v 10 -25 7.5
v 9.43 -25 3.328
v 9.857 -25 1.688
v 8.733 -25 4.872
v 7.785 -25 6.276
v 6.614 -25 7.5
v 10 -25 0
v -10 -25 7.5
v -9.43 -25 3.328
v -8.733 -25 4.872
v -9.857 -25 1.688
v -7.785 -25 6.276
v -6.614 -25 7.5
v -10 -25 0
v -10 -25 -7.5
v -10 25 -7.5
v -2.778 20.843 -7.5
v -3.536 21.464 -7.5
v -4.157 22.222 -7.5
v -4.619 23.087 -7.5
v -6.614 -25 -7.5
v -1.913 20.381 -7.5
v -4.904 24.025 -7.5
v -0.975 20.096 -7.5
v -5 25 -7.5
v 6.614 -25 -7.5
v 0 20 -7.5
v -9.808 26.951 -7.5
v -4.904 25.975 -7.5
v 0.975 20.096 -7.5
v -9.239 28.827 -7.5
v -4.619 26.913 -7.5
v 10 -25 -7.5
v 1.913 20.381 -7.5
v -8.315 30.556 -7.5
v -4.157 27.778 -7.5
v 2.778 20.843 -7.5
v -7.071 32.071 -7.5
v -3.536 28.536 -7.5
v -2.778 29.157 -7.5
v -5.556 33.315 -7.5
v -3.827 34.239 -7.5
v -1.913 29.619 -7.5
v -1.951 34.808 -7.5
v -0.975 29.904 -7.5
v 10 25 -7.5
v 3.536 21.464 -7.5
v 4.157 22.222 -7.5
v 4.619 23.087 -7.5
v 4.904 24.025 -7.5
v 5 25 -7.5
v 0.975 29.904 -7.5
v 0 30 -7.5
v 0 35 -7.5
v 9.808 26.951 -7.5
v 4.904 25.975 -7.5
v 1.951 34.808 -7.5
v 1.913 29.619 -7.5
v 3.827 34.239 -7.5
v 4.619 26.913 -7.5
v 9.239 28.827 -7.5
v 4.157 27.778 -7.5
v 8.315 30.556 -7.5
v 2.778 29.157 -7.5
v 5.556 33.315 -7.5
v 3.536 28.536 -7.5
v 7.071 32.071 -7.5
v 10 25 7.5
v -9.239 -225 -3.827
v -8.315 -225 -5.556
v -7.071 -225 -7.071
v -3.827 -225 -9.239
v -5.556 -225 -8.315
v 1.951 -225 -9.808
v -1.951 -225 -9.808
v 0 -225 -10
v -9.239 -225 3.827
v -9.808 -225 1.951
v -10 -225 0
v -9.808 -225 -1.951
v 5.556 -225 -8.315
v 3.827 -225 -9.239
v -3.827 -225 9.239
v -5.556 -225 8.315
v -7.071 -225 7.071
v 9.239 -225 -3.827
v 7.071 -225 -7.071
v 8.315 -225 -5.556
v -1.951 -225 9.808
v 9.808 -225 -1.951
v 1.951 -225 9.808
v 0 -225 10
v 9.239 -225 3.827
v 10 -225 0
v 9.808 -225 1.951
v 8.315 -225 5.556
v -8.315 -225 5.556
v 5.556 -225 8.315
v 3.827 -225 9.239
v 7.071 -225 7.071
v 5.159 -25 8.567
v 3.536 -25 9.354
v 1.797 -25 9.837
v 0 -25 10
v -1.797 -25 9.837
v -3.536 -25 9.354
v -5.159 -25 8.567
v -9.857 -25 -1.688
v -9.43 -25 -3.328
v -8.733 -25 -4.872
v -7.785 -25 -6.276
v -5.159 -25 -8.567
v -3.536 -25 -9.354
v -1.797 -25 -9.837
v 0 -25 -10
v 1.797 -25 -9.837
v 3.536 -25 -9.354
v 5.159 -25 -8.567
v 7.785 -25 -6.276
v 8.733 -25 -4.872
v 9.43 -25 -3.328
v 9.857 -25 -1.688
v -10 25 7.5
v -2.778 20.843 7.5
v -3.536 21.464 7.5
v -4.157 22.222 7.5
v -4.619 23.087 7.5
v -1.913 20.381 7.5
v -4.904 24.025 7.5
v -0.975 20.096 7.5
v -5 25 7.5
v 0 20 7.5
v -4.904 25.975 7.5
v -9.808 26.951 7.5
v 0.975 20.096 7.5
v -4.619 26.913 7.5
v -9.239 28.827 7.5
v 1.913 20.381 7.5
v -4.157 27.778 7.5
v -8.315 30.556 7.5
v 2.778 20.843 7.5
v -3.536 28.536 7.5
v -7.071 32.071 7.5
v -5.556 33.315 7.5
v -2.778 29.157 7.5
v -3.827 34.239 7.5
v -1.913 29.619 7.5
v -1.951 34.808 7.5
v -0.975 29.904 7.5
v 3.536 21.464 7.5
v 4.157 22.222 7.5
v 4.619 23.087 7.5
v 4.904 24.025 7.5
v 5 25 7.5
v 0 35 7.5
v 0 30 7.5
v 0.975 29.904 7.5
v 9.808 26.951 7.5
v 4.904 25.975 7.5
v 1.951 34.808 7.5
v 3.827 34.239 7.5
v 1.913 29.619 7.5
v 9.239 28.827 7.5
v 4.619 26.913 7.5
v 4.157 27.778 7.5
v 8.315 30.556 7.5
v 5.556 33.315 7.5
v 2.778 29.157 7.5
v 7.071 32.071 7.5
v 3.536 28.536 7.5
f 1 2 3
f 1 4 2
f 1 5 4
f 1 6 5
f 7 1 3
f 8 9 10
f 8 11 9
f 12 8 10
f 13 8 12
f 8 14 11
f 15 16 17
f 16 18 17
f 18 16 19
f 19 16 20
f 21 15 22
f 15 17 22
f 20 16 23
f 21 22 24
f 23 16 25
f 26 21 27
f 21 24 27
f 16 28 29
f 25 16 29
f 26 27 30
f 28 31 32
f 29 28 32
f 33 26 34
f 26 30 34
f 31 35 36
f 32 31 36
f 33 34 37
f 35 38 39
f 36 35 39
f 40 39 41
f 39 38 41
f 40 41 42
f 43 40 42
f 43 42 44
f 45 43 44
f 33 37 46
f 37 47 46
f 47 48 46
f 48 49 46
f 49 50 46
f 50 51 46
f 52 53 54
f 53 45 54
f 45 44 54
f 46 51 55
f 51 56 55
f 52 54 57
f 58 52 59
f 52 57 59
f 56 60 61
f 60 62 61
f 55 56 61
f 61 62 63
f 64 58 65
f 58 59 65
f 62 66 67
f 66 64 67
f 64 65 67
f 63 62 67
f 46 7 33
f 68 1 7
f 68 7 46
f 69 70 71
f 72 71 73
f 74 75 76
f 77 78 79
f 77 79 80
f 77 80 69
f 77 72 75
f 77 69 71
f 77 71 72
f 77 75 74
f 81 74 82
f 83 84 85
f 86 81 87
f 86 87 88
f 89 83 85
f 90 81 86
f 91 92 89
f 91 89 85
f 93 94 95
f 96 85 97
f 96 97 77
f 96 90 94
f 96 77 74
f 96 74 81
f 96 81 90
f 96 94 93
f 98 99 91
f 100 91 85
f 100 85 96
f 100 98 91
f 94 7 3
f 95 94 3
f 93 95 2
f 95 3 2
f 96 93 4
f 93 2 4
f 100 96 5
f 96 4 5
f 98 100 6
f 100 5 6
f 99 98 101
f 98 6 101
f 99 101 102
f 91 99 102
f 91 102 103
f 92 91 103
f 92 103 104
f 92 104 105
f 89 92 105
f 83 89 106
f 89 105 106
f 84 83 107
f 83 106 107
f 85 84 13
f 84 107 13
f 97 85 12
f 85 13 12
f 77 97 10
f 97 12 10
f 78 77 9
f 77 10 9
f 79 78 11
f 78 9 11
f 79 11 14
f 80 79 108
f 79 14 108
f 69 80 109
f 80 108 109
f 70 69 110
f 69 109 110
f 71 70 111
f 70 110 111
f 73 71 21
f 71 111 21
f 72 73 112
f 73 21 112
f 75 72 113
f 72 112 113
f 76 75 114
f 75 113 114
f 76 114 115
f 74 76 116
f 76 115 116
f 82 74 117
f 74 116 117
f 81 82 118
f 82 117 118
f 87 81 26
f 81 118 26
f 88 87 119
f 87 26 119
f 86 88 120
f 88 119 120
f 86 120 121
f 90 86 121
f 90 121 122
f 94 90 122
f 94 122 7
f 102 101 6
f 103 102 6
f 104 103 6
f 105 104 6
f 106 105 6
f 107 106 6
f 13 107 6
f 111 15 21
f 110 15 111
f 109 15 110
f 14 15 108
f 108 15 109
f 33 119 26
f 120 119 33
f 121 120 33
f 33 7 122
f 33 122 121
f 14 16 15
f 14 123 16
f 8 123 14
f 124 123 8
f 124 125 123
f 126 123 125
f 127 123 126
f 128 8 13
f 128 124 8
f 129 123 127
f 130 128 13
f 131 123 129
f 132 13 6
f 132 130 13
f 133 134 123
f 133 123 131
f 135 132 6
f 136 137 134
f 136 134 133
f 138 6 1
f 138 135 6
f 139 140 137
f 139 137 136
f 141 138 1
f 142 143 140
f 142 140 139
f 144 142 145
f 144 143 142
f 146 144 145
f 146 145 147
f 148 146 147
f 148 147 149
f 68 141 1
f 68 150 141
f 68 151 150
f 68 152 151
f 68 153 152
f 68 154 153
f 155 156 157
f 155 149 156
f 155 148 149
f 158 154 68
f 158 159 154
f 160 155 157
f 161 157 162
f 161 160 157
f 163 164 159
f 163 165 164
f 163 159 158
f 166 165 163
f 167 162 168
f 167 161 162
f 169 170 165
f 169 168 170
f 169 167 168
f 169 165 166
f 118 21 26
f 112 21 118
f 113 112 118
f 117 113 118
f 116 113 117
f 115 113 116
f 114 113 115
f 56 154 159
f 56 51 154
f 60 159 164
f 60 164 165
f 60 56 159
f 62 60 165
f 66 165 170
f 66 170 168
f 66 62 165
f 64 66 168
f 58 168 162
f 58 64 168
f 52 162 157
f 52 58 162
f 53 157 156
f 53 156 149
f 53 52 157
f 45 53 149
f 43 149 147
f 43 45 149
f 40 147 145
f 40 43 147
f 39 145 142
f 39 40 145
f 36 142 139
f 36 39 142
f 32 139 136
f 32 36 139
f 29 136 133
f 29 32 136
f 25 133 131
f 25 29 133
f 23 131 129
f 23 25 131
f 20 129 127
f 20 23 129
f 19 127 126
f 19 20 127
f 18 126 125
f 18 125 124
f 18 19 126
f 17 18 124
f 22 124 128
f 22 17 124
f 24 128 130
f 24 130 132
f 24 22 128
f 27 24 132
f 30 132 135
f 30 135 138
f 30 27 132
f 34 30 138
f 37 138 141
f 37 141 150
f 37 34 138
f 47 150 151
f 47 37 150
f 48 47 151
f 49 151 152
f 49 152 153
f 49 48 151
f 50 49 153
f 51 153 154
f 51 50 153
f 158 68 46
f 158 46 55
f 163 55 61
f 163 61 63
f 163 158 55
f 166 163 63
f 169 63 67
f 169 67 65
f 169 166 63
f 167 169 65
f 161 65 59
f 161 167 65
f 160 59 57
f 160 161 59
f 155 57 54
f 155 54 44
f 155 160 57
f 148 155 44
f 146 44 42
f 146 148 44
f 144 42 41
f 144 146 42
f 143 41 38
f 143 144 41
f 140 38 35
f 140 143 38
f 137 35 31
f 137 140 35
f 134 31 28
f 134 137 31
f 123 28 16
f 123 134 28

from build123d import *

# Parameters (mm, degrees)
F0_R     = 5
F1_DEPTH = 7.5
F2_R     = 10
F3_DEPTH = 200


with BuildPart() as f1:
    # F0 (on Top) → F1 (new body, symmetric)
    with BuildSketch(Plane.XY):
        with BuildLine():
            Line((-10, -25), (10, -25))
            Line((10, -25), (10, 25))
            ThreePointArc((10, 25), (0, 35), (-10, 25))
            Line((-10, 25), (-10, -25))
        make_face()
        with Locations((0, 25)):
            Circle(F0_R, mode=Mode.SUBTRACT)
    extrude(amount=F1_DEPTH, both=True)

    # F2 (on face) → F3 (join)
    with BuildSketch(Plane.XZ.offset(25)):
        Circle(F2_R)
    extrude(amount=F3_DEPTH)


solid = f1.part
